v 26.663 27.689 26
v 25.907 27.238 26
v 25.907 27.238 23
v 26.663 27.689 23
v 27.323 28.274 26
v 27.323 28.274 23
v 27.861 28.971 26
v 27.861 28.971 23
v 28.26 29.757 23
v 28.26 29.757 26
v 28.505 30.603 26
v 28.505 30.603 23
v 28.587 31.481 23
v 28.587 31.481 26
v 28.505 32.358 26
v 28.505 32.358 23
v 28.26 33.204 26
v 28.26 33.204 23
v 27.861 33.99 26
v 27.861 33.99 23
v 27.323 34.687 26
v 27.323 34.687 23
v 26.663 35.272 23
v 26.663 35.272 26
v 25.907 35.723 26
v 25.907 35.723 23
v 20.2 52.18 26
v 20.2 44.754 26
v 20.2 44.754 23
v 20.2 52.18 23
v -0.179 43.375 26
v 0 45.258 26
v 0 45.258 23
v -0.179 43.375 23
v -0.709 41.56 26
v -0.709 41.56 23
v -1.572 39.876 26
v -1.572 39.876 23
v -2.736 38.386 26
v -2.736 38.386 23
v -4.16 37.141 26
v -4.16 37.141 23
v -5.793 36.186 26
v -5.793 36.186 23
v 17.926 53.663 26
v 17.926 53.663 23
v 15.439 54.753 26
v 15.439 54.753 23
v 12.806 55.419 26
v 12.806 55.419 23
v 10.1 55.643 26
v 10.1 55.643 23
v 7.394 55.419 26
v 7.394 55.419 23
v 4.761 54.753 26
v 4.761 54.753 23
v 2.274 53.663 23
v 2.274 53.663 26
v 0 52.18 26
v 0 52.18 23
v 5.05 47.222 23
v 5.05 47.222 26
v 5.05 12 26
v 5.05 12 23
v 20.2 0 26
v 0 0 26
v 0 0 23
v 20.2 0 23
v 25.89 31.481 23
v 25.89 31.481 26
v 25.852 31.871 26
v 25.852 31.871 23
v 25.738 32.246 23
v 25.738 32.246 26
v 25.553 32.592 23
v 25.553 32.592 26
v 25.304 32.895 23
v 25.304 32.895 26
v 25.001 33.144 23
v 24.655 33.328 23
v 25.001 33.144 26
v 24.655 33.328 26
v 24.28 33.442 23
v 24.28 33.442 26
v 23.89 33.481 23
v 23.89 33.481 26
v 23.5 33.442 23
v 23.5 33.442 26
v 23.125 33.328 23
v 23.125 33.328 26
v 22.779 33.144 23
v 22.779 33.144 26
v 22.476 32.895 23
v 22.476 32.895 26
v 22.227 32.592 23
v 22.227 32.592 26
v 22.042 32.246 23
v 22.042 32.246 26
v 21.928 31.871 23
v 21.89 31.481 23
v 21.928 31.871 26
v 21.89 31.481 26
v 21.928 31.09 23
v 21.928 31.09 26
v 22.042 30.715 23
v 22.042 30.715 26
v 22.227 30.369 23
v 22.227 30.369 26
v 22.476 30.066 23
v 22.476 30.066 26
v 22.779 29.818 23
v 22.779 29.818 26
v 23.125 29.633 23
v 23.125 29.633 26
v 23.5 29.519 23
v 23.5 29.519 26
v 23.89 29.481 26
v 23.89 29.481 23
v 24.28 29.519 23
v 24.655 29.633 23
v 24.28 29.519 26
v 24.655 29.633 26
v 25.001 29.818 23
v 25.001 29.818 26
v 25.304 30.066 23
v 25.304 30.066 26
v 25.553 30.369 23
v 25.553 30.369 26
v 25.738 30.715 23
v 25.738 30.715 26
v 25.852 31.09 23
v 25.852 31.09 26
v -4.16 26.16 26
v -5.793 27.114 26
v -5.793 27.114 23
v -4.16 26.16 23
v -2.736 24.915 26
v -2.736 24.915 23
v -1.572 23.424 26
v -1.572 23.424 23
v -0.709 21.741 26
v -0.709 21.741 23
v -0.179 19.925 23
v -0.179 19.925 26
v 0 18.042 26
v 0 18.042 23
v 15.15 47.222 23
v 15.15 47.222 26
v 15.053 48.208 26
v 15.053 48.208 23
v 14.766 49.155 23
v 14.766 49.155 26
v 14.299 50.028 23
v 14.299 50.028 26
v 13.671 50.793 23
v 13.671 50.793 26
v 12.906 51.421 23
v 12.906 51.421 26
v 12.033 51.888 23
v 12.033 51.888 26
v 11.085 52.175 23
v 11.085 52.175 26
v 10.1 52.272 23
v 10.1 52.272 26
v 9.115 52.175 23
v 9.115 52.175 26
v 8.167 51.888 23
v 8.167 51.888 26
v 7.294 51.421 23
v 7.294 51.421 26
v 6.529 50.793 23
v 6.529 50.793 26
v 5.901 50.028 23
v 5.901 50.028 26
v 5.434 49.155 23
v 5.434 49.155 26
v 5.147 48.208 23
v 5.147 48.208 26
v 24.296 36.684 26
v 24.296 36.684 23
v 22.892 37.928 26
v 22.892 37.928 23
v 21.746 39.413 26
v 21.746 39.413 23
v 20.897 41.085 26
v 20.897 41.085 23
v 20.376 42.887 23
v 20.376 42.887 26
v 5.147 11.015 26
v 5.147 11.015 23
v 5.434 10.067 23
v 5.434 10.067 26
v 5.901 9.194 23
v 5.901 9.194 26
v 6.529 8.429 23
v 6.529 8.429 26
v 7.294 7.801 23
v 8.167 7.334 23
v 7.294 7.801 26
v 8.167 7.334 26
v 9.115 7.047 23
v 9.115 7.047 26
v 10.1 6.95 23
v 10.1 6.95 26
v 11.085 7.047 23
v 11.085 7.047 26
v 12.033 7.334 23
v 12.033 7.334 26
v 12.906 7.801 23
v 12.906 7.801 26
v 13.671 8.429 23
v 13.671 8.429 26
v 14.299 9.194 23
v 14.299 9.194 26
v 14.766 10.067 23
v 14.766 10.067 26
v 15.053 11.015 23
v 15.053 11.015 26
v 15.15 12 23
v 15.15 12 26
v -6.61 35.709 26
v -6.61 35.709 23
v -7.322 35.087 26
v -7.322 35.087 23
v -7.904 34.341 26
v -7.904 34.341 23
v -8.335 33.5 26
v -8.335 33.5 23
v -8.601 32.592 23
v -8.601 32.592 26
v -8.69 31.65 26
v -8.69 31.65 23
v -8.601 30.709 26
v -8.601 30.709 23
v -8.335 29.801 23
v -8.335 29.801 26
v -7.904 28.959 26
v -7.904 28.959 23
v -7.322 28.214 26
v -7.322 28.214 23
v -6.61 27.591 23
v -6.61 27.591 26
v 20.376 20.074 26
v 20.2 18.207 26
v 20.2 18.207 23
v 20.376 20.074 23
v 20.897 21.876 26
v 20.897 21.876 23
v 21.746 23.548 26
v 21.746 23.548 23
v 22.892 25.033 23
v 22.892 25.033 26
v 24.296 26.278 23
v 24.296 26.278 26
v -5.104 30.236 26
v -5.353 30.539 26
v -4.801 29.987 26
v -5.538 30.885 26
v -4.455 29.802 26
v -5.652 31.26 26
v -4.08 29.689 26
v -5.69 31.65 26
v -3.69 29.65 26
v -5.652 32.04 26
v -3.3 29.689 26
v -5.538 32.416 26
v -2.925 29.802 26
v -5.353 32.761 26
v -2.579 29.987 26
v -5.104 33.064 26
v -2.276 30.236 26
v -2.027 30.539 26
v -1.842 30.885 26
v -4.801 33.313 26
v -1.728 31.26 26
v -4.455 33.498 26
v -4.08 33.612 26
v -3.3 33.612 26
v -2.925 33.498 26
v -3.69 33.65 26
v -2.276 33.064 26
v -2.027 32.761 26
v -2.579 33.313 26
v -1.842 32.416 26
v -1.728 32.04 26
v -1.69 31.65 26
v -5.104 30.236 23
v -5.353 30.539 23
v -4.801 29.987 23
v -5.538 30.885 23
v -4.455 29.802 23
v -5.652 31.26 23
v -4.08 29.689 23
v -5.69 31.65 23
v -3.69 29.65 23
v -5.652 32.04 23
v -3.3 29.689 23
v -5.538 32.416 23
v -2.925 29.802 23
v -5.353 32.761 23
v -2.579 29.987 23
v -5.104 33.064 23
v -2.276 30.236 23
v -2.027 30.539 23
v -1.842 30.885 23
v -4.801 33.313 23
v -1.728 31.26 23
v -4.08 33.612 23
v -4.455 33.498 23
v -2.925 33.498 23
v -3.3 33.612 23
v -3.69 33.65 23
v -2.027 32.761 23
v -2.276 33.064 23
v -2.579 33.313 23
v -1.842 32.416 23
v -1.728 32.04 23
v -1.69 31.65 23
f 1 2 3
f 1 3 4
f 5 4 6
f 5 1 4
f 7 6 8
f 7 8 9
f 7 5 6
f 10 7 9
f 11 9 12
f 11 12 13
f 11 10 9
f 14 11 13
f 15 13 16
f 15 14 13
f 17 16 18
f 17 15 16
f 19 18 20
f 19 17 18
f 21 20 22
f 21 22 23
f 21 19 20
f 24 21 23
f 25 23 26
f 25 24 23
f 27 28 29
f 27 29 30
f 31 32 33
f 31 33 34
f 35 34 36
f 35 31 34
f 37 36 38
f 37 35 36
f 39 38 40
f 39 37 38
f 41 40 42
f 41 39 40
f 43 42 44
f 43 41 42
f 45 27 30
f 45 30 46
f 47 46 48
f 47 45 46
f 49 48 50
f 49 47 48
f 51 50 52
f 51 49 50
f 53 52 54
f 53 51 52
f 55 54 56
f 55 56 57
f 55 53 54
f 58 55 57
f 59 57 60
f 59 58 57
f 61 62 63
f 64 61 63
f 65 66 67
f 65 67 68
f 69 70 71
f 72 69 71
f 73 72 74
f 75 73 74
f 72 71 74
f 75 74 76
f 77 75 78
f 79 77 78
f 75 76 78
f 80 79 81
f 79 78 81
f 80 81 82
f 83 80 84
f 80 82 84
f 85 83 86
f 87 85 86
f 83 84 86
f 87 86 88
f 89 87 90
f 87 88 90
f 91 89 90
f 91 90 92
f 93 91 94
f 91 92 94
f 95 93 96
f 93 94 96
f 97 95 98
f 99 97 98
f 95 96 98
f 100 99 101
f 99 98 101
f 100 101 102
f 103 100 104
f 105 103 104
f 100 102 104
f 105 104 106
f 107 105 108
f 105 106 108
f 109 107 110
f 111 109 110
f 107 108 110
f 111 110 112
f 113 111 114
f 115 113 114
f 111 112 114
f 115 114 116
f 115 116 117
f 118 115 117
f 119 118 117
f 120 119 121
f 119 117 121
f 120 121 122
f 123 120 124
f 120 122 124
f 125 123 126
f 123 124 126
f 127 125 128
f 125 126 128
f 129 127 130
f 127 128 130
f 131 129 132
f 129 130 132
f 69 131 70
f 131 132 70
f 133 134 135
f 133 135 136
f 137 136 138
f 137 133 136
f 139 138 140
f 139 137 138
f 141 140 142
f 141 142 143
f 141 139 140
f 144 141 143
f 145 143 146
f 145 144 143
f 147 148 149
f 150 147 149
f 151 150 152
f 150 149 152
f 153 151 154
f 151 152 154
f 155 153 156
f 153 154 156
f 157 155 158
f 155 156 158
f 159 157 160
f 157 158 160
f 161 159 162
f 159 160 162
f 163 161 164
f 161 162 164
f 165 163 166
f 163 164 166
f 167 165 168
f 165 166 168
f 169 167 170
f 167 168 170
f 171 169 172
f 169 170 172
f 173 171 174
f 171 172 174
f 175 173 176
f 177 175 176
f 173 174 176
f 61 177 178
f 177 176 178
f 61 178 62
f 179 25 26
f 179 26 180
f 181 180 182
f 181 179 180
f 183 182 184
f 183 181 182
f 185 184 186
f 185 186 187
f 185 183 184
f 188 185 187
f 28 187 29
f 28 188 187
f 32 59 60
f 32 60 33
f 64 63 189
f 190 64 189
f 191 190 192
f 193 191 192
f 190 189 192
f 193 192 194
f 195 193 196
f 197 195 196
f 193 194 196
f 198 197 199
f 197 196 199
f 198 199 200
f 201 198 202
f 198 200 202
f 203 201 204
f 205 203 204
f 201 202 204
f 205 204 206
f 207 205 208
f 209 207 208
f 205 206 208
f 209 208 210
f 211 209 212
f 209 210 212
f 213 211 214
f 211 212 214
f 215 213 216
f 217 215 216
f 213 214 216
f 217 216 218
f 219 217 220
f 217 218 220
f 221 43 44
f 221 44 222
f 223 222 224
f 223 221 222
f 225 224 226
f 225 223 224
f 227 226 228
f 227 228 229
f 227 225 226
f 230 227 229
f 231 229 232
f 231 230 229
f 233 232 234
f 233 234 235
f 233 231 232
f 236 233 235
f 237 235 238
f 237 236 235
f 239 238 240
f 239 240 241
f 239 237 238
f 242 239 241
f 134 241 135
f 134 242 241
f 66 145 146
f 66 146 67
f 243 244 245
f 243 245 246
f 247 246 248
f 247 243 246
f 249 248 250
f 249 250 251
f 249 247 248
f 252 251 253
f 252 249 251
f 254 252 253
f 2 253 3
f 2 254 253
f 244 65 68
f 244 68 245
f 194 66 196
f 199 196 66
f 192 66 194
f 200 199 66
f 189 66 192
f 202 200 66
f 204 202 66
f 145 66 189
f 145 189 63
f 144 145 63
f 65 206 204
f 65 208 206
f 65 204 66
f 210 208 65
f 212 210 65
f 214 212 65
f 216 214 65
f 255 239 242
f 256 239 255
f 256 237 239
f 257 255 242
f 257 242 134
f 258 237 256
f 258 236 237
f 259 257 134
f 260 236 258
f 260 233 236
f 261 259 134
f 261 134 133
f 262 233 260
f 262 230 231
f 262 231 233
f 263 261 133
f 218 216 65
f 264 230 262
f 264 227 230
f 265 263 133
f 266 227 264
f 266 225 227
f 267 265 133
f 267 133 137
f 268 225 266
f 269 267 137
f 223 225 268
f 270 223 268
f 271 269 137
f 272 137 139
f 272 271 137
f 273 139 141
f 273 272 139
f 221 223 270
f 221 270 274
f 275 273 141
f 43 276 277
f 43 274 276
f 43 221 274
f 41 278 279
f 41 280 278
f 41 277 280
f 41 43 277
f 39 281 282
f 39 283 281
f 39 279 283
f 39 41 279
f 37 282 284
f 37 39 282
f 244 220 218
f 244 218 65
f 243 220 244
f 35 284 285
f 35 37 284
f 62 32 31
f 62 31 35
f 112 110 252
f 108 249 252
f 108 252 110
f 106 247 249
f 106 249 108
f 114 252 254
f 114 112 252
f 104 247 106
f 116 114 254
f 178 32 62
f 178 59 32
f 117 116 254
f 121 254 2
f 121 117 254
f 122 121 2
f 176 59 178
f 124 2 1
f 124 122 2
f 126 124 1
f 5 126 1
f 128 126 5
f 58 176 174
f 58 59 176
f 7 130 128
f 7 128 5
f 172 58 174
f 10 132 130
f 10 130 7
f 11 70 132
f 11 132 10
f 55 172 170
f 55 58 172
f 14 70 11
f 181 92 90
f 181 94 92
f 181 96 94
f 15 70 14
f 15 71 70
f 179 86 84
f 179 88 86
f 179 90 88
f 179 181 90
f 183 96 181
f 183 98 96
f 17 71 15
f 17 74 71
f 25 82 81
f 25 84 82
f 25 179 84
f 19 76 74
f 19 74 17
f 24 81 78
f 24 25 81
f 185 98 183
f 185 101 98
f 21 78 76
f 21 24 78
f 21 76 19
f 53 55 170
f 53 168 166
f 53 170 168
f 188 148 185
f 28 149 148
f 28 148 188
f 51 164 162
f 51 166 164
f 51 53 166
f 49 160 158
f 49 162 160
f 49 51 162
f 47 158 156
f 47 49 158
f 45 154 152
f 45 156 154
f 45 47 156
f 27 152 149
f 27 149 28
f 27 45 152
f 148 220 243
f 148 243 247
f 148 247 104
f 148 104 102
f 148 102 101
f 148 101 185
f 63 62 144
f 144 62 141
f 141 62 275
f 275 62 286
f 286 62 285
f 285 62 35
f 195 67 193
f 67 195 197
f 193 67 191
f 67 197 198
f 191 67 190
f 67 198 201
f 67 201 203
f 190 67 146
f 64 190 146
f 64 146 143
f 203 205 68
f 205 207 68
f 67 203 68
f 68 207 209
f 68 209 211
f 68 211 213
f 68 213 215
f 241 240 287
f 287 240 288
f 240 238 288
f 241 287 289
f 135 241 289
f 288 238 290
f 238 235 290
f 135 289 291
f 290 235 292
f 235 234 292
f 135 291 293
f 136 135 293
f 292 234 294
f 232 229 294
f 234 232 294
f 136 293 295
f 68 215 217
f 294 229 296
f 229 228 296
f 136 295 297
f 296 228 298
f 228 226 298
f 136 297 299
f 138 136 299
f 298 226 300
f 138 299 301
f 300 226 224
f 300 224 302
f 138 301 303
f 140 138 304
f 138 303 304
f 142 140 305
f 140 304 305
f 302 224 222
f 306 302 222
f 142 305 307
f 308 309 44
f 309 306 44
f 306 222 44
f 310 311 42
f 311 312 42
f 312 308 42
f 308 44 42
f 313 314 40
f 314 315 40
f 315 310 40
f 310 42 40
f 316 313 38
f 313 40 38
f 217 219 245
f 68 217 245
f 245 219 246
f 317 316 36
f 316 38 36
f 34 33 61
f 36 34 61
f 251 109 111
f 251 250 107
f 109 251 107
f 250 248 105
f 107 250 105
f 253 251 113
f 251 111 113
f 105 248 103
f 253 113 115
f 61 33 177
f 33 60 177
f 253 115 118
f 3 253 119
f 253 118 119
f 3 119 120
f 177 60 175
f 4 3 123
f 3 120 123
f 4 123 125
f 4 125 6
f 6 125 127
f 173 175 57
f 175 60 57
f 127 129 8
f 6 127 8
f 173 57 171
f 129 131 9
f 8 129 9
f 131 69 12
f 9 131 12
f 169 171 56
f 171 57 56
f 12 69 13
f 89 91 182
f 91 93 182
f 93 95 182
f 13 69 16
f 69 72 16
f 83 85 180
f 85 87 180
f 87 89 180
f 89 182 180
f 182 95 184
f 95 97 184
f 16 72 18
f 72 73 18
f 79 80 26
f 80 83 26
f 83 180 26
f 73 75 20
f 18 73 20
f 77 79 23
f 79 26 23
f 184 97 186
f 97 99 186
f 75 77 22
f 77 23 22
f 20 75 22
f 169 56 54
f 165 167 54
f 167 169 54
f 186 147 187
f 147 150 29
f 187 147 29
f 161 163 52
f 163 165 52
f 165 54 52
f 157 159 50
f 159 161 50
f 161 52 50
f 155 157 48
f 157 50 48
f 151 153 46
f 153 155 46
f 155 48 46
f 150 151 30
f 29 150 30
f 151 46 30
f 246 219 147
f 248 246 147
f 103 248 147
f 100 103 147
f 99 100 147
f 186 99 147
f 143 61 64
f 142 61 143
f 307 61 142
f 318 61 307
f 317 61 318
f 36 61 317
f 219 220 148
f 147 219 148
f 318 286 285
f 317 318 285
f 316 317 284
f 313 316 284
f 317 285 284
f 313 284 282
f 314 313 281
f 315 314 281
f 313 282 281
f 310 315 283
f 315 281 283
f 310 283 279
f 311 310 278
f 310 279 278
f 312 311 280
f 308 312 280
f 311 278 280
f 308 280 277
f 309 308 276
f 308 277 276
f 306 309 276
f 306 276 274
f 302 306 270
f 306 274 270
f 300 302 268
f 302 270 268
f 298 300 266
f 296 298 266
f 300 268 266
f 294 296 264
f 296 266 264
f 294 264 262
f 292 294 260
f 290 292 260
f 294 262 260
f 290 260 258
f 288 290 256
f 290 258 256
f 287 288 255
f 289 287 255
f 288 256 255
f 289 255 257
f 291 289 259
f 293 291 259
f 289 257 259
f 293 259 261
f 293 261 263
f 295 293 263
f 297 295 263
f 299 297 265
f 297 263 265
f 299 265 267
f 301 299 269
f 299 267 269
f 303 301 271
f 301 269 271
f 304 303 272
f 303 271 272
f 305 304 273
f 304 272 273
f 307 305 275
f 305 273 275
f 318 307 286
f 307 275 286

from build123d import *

# Parameters (mm, degrees)
SKETCH1_R           = 2
BOSS_EXTRUDE1_DEPTH = 3


with BuildPart() as part:
    # Sketch1 → Boss-Extrude1 (new body)
    with BuildSketch(Plane.XY.offset(26)):
        with BuildLine():
            Line((0, 0), (20.2, 0))
            Line((20.2, 0), (20.2, 18.206774978))
            ThreePointArc((20.2, 18.206774978), (21.746211994, 23.548447782), (25.906693669, 27.238248874))
            ThreePointArc((25.906693669, 27.238248874), (28.587297404, 31.480600764), (25.906693669, 35.722952653))
            ThreePointArc((25.906693669, 35.722952653), (21.746211994, 39.412753746), (20.2, 44.754426549))
            Line((20.2, 44.754426549), (20.2, 52.179630025))
            ThreePointArc((20.2, 52.179630025), (10.1, 55.643160629), (0, 52.179630025))
            Line((0, 52.179630025), (0, 45.258439456))
            ThreePointArc((0, 45.258439456), (-1.571872489, 39.876370461), (-5.793333333, 36.186286704))
            ThreePointArc((-5.793333333, 36.186286704), (-8.69, 31.650210328), (-5.793333333, 27.114133952))
            ThreePointArc((-5.793333333, 27.114133952), (-1.571872489, 23.424050195), (0, 18.0419812))
            Line((0, 18.0419812), (0, 0))
        make_face()
        with Locations((-3.69, 31.650210328)):
            Circle(SKETCH1_R, mode=Mode.SUBTRACT)
        with Locations((23.89, 31.480600764)):
            Circle(SKETCH1_R, mode=Mode.SUBTRACT)
        with BuildLine():
            Line((15.15, 12), (15.15, 47.222342094))
            ThreePointArc((15.15, 47.222342094), (10.1, 52.272342094), (5.05, 47.222342094))
            Line((5.05, 47.222342094), (5.05, 12))
            ThreePointArc((5.05, 12), (10.1, 6.95), (15.15, 12))
        make_face(mode=Mode.SUBTRACT)
    extrude(amount=-BOSS_EXTRUDE1_DEPTH)


solid = part.part
